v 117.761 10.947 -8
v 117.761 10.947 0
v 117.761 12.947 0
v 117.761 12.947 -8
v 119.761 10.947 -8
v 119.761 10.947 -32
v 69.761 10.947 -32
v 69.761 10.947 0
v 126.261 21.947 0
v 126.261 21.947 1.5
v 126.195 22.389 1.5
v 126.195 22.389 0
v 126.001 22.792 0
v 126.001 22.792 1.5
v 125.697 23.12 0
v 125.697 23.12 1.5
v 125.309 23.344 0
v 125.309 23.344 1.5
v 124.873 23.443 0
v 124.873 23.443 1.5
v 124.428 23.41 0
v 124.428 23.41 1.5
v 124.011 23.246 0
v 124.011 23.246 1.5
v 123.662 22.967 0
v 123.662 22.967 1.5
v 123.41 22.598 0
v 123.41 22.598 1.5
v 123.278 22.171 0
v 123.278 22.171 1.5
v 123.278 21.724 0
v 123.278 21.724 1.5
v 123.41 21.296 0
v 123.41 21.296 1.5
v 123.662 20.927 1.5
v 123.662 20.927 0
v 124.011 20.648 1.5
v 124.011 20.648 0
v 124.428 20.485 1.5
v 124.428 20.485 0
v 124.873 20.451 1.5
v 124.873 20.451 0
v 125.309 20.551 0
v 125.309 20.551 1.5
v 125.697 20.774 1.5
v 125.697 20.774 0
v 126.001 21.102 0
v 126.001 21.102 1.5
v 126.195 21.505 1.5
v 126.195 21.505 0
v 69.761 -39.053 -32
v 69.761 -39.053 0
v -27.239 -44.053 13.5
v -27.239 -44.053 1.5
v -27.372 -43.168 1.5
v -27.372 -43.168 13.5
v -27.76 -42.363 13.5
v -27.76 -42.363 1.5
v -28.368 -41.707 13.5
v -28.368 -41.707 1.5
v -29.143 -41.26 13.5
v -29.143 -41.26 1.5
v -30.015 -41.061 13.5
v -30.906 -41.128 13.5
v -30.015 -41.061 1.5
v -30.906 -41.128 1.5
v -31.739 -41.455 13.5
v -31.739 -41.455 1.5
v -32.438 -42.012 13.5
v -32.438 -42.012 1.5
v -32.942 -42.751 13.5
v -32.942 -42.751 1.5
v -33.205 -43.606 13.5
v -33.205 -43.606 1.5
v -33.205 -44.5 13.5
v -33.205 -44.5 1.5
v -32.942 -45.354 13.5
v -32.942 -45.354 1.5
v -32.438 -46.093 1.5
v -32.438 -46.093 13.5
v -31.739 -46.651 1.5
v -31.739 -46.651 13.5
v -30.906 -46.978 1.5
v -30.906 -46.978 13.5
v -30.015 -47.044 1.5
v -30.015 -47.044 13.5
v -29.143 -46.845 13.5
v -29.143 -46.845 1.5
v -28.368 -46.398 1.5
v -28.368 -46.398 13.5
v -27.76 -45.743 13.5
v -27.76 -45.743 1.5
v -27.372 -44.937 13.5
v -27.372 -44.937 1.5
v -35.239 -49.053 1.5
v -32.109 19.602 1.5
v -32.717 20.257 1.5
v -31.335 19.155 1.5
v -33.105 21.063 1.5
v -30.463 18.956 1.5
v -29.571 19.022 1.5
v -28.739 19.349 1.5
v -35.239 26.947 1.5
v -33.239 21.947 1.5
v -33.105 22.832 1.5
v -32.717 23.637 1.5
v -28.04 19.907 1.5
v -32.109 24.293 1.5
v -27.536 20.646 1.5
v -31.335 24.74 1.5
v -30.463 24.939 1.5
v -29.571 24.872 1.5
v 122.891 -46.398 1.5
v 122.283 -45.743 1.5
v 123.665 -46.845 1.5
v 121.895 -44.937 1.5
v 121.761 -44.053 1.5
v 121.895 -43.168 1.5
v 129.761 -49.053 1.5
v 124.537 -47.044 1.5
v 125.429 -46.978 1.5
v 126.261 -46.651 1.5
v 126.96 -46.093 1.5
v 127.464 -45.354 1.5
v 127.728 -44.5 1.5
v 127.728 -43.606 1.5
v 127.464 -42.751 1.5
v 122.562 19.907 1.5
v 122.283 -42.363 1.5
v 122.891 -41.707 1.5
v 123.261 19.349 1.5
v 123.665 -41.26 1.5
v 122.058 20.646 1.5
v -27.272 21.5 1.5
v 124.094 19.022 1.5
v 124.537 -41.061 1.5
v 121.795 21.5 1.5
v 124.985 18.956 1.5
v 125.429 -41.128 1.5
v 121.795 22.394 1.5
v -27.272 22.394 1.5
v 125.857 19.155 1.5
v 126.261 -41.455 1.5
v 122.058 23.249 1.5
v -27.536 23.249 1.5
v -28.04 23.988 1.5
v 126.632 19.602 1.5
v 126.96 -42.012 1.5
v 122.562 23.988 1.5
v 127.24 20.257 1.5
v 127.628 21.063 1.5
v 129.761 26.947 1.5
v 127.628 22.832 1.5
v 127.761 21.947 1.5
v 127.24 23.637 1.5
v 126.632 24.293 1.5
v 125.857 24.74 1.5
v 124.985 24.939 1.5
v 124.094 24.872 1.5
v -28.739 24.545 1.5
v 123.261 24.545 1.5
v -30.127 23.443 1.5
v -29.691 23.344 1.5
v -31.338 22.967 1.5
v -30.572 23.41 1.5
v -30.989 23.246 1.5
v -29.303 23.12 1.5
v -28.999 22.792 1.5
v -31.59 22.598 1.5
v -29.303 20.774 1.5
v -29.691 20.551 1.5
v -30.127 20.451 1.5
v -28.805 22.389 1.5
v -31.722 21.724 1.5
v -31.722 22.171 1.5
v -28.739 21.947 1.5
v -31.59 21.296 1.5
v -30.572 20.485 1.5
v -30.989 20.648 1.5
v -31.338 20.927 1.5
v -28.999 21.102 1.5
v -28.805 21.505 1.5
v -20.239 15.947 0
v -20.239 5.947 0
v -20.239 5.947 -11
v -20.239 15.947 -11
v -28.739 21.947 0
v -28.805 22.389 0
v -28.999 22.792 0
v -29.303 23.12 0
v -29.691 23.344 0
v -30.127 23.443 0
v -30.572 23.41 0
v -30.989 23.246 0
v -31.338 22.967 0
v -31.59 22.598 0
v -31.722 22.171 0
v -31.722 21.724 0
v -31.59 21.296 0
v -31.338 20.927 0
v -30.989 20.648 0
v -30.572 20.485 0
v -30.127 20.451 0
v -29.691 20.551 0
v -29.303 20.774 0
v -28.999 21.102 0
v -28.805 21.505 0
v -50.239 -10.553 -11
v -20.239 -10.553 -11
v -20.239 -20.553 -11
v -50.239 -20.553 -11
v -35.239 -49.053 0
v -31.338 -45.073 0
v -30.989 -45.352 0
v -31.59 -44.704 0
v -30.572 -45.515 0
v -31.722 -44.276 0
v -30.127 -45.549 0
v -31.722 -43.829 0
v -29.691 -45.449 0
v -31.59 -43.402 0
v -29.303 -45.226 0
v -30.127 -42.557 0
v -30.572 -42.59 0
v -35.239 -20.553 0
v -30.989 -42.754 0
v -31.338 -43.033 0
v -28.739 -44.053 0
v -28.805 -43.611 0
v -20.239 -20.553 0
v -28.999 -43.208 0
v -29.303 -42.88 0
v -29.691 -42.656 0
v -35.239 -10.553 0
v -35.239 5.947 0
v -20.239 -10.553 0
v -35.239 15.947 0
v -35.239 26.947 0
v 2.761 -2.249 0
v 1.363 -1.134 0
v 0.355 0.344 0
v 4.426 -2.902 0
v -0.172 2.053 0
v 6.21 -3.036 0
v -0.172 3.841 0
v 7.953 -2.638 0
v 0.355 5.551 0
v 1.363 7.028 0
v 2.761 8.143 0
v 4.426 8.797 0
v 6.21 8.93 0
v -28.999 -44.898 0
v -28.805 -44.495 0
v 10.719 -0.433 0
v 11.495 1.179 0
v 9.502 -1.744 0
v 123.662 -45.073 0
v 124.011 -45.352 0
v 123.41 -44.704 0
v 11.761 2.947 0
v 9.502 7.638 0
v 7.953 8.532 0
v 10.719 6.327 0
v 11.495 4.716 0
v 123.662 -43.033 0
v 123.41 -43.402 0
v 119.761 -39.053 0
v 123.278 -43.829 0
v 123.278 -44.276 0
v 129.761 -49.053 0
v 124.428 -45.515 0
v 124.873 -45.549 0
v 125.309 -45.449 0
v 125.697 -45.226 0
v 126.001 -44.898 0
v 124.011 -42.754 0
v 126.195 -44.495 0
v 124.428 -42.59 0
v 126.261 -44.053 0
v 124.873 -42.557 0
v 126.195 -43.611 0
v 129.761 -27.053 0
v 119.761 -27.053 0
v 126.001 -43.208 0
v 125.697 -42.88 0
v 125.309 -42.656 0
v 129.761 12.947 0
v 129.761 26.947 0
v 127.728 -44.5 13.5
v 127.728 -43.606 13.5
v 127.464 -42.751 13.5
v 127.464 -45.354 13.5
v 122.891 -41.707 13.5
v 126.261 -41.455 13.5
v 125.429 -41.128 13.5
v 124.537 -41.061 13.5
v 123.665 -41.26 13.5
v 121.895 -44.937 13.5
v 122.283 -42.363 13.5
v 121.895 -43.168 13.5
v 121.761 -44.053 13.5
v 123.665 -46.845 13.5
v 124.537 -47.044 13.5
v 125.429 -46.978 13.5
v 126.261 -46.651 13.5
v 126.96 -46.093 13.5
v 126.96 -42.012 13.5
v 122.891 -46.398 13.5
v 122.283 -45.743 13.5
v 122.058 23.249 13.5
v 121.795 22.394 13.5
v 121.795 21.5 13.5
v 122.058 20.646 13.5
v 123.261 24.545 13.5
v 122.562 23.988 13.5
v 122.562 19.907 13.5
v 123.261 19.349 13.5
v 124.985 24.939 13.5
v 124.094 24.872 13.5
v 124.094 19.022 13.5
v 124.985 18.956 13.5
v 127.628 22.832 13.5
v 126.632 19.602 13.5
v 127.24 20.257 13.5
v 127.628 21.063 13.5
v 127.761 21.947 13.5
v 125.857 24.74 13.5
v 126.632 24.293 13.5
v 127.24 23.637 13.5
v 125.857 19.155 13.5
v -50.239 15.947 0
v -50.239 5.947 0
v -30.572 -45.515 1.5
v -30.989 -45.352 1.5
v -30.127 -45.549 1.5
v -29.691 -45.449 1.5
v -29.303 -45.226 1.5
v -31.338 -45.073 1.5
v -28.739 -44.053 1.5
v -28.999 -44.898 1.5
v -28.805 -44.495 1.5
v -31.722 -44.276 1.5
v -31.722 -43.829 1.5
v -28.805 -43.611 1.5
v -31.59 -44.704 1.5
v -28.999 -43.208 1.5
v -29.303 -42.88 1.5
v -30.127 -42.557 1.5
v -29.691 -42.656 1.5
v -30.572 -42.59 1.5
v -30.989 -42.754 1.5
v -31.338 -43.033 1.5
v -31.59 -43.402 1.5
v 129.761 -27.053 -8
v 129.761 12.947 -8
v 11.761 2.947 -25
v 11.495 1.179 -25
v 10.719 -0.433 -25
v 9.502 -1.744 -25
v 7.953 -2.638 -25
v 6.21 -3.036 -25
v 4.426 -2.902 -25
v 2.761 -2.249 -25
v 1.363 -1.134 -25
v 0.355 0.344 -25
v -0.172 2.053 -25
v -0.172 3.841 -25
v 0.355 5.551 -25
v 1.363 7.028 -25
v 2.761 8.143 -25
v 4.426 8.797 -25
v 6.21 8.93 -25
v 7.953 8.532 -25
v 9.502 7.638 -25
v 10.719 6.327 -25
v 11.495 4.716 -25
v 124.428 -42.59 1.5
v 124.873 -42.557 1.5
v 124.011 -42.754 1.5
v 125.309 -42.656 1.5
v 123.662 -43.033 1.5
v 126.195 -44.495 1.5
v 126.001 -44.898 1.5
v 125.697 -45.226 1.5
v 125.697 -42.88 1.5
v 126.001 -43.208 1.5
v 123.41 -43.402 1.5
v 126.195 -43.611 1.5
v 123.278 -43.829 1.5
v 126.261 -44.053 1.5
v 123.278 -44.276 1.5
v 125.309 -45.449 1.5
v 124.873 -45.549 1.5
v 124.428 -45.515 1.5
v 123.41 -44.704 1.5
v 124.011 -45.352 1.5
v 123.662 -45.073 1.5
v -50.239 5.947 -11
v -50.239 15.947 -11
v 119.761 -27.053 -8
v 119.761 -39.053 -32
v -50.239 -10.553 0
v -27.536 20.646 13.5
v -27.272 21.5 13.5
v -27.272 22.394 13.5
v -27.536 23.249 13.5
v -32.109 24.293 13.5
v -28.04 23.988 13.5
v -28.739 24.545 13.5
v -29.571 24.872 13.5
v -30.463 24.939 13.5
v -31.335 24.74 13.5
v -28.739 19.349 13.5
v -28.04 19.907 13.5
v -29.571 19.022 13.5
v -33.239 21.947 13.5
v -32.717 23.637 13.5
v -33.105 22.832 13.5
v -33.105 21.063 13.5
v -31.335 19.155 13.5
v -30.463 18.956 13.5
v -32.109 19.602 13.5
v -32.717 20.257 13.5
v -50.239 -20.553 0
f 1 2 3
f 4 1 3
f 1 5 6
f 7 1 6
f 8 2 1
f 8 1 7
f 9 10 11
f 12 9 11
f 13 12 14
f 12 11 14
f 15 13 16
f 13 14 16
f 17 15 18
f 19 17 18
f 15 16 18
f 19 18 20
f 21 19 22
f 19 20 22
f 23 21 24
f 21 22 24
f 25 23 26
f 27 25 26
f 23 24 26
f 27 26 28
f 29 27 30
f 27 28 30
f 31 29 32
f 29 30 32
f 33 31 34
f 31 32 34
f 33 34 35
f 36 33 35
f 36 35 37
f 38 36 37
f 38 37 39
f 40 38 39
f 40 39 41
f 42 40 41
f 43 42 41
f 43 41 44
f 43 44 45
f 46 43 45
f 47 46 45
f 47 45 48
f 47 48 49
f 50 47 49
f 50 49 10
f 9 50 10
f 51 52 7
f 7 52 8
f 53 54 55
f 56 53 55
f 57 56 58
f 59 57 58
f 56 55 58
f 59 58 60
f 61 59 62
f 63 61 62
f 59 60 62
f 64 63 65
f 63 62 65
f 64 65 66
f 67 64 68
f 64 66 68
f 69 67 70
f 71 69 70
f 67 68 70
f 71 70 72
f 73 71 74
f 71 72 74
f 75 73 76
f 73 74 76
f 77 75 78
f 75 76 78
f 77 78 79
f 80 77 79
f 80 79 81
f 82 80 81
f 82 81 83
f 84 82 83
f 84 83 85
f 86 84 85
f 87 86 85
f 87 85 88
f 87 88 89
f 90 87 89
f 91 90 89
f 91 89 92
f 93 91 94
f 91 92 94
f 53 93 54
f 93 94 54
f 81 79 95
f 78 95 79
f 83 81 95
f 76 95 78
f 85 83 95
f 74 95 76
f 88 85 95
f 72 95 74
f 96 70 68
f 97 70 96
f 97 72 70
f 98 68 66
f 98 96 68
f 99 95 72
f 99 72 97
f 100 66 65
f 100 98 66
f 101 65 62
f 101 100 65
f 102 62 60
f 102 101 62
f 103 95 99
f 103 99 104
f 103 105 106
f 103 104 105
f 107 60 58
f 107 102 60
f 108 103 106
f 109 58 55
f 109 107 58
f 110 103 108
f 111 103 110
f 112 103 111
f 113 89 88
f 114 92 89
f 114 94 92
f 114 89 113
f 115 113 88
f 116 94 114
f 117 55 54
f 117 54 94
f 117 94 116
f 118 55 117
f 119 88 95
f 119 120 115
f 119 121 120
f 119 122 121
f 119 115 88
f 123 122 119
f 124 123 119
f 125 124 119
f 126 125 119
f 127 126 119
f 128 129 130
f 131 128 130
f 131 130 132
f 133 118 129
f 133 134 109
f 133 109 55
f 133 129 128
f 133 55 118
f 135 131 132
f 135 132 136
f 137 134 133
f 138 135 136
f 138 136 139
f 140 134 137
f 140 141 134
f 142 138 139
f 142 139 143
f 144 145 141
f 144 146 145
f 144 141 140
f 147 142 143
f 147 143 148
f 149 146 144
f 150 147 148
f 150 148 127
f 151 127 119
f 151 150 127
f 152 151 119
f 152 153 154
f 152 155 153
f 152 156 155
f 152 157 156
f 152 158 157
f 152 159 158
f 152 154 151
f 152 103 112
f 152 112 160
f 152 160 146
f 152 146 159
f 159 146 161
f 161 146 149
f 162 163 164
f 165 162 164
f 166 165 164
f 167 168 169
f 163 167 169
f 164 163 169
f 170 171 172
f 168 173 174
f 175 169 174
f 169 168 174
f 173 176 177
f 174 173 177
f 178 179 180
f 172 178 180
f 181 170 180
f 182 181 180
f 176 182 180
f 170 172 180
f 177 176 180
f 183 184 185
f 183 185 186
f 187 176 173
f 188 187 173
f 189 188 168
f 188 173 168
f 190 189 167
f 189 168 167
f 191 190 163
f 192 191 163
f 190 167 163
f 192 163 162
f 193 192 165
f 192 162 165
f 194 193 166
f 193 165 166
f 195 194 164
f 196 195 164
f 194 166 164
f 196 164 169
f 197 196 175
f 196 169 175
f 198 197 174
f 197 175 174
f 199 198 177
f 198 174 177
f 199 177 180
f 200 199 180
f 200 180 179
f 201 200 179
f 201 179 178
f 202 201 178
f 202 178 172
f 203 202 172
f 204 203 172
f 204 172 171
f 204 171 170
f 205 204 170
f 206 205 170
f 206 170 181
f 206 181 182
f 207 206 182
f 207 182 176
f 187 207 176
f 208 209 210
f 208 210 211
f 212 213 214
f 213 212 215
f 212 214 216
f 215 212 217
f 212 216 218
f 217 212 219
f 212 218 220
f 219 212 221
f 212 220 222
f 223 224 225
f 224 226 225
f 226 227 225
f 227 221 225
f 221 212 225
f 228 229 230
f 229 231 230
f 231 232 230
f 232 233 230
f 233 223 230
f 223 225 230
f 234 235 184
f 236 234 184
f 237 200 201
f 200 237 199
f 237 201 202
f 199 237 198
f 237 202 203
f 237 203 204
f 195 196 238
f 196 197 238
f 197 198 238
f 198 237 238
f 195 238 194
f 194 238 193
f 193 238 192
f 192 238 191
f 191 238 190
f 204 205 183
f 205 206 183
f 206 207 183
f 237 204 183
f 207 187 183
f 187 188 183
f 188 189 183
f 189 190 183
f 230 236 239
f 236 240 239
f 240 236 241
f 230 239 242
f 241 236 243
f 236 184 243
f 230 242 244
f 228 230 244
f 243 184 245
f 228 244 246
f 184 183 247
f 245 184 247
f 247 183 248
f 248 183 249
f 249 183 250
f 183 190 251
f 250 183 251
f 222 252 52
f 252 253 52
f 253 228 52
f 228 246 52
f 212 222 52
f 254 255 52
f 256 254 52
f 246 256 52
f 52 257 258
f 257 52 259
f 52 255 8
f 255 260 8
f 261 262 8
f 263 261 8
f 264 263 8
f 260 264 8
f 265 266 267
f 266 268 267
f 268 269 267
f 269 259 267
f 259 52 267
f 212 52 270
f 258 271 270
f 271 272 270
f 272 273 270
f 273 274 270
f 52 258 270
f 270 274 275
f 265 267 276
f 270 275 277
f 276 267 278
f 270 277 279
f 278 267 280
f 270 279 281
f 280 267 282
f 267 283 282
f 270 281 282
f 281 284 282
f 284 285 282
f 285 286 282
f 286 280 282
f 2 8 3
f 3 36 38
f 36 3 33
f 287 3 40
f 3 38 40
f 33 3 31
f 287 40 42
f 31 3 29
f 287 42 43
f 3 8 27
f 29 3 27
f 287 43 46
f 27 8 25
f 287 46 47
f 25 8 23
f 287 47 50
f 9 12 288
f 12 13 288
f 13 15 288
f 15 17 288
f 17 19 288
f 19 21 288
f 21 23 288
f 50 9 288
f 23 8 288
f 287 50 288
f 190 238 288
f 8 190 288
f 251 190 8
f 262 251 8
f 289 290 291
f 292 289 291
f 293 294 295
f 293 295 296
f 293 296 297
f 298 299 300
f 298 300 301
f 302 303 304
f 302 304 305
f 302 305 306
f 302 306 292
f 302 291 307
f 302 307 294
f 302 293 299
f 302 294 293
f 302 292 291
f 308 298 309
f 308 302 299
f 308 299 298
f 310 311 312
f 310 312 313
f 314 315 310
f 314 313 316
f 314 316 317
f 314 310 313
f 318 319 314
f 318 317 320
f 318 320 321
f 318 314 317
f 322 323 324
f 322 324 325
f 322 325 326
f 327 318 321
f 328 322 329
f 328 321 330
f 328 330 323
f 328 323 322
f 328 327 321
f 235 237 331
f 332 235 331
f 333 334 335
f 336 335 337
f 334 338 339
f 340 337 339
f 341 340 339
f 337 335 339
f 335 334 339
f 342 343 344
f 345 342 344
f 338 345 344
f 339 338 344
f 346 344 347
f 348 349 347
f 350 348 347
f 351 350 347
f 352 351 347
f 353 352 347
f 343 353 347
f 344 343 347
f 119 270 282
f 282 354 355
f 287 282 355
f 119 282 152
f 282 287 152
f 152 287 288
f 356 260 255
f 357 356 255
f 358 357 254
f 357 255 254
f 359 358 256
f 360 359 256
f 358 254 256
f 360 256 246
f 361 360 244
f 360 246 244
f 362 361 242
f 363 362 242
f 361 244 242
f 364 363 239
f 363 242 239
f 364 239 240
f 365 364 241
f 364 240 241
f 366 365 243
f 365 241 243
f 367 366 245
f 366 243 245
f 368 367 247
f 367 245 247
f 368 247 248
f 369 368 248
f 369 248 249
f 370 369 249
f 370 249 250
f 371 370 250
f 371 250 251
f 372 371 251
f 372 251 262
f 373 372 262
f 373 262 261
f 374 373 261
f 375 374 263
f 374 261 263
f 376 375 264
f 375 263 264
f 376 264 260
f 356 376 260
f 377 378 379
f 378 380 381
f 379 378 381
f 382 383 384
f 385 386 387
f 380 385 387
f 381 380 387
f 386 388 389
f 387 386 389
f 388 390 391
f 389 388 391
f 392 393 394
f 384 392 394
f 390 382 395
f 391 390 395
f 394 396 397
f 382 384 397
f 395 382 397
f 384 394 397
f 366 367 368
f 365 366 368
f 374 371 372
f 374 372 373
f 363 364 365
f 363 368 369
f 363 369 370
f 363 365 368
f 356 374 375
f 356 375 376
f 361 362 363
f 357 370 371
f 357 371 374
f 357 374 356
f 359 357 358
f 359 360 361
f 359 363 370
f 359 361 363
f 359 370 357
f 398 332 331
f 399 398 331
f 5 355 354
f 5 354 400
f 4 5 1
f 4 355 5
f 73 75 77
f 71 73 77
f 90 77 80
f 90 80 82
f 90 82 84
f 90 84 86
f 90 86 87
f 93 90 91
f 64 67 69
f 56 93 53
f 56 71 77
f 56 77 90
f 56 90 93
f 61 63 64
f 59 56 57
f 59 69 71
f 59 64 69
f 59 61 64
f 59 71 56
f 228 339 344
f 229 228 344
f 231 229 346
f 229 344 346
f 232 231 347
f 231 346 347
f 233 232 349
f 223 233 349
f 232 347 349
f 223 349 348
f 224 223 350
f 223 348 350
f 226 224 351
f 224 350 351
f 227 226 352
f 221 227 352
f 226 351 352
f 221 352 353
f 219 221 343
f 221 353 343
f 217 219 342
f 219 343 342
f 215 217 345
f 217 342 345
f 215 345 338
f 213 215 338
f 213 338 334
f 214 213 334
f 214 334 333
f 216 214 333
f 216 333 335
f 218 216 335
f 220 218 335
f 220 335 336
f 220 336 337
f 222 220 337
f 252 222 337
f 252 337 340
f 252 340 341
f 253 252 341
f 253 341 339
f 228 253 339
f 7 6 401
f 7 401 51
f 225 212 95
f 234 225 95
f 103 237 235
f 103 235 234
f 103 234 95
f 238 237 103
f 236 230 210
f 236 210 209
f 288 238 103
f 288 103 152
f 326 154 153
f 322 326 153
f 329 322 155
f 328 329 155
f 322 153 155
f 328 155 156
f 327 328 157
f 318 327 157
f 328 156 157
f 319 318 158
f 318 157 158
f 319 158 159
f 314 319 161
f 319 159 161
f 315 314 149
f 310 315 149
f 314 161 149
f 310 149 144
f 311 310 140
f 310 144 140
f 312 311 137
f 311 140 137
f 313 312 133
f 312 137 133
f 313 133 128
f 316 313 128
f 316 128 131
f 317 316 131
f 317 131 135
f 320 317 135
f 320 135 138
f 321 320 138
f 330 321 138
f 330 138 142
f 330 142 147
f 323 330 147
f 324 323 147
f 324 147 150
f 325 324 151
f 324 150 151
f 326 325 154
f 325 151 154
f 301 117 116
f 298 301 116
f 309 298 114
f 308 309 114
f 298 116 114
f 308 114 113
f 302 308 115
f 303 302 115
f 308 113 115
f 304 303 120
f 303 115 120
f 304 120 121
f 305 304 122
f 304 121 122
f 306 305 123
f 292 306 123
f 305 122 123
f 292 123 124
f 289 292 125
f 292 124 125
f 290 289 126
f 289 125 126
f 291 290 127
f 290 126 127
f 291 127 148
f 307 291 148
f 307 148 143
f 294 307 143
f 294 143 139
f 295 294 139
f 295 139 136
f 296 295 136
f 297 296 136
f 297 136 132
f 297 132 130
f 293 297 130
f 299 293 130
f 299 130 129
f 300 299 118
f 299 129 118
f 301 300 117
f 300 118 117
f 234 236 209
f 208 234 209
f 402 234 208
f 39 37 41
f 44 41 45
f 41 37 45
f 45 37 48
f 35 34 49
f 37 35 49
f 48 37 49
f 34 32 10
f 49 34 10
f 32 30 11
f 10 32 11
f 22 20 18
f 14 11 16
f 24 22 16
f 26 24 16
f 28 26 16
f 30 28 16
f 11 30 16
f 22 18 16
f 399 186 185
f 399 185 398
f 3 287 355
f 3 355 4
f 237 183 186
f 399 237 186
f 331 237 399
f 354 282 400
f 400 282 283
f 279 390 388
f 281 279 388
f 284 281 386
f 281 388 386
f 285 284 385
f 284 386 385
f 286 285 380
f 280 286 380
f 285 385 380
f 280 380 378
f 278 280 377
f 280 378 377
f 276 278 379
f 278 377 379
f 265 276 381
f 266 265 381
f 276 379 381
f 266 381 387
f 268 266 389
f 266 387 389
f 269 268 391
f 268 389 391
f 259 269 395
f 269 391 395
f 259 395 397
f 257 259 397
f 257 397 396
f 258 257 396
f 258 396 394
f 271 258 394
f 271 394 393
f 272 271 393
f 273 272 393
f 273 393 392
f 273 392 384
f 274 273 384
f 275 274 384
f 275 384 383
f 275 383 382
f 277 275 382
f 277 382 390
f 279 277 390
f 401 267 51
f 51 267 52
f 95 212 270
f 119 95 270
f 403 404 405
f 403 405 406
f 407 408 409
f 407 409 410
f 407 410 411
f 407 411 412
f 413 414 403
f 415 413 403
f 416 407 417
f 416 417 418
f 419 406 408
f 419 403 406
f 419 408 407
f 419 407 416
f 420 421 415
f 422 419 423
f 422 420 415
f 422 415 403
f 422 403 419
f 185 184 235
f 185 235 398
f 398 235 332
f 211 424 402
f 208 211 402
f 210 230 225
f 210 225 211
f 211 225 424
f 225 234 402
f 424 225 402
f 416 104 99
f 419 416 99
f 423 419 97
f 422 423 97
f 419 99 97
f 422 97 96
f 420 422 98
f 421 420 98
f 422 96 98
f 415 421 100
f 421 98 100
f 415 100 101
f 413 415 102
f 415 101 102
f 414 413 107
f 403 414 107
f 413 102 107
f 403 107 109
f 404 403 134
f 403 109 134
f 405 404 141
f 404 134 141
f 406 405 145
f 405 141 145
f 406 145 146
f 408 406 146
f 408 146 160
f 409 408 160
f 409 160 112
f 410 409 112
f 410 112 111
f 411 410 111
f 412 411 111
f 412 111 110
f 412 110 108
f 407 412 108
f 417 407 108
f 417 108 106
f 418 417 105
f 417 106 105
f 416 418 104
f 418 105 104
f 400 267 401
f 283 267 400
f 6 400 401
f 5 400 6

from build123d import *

# Parameters (mm, degrees)
SKETCH1_W           = 165
SKETCH1_H           = 76
BOSS_EXTRUDE1_DEPTH = 1.5
CUT_EXTRUDE1_REACH  = 140.731
SKETCH2_R           = 1.5
SKETCH3_W           = 12
SKETCH3_H           = 40
BOSS_EXTRUDE2_DEPTH = 8
SKETCH4_W           = 50
SKETCH4_H           = 50
BOSS_EXTRUDE3_DEPTH = 32
SKETCH5_W           = 30
SKETCH5_H           = 10
BOSS_EXTRUDE4_DEPTH = 11
SKETCH6_R           = 6
BOSS_EXTRUDE5_DEPTH = 25
SKETCH7_R           = 3
BOSS_EXTRUDE6_DEPTH = 12


with BuildPart() as part:
    # Sketch1 → Boss-Extrude1 (new body)
    with BuildSketch(Plane.XY):
        with Locations((47.261306533, -11.052763819)):
            Rectangle(SKETCH1_W, SKETCH1_H)
    extrude(amount=BOSS_EXTRUDE1_DEPTH)

    # Sketch2 → Cut-Extrude1 (cut, up to next)
    with BuildSketch(Plane.XY.offset(1.5), mode=Mode.PRIVATE) as cut_extrude1_sk1:
        with Locations((124.761306533, 21.947236181)):
            Circle(SKETCH2_R)
    cut_extrude1_tool1 = extrude(cut_extrude1_sk1.sketch, amount=-CUT_EXTRUDE1_REACH, mode=Mode.PRIVATE) & part.part
    # Sketch2 → Cut-Extrude1 (cut, up to next)
    with BuildSketch(Plane.XY.offset(1.5), mode=Mode.PRIVATE) as cut_extrude1_sk2:
        with Locations((124.761306533, -44.052763819)):
            Circle(SKETCH2_R)
    cut_extrude1_tool2 = extrude(cut_extrude1_sk2.sketch, amount=-CUT_EXTRUDE1_REACH, mode=Mode.PRIVATE) & part.part
    # Sketch2 → Cut-Extrude1 (cut, up to next)
    with BuildSketch(Plane.XY.offset(1.5), mode=Mode.PRIVATE) as cut_extrude1_sk3:
        with Locations((-30.238693467, -44.052763819)):
            Circle(SKETCH2_R)
    cut_extrude1_tool3 = extrude(cut_extrude1_sk3.sketch, amount=-CUT_EXTRUDE1_REACH, mode=Mode.PRIVATE) & part.part
    # Sketch2 → Cut-Extrude1 (cut, up to next)
    with BuildSketch(Plane.XY.offset(1.5), mode=Mode.PRIVATE) as cut_extrude1_sk4:
        with Locations((-30.238693467, 21.947236181)):
            Circle(SKETCH2_R)
    cut_extrude1_tool4 = extrude(cut_extrude1_sk4.sketch, amount=-CUT_EXTRUDE1_REACH, mode=Mode.PRIVATE) & part.part
    add(cut_extrude1_tool1.solids().sort_by_distance((124.761307, 21.947236, 1.5))[0], mode=Mode.SUBTRACT)
    add(cut_extrude1_tool2.solids().sort_by_distance((124.761307, -44.052764, 1.5))[0], mode=Mode.SUBTRACT)
    add(cut_extrude1_tool3.solids().sort_by_distance((-30.238693, -44.052764, 1.5))[0], mode=Mode.SUBTRACT)
    add(cut_extrude1_tool4.solids().sort_by_distance((-30.238693, 21.947236, 1.5))[0], mode=Mode.SUBTRACT)

    # Sketch3 → Boss-Extrude2 (add)
    with BuildSketch(Plane(origin=(0, 0, 0), x_dir=(-1, 0, 0), z_dir=(0, 0, -1))):
        with Locations((-123.761306533, -7.052763819)):
            Rectangle(SKETCH3_W, SKETCH3_H)
    extrude(amount=BOSS_EXTRUDE2_DEPTH)

    # Sketch4 → Boss-Extrude3 (add)
    with BuildSketch(Plane(origin=(0, 0, 0), x_dir=(-1, 0, 0), z_dir=(0, 0, -1))):
        with Locations((-94.761306533, -14.052763819)):
            Rectangle(SKETCH4_W, SKETCH4_H)
    extrude(amount=BOSS_EXTRUDE3_DEPTH)

    # Sketch5 → Boss-Extrude4 (add)
    with BuildSketch(Plane(origin=(0, 0, 0), x_dir=(-1, 0, 0), z_dir=(0, 0, -1))):
        with Locations((35.238693467, 10.947236181)):
            Rectangle(SKETCH5_W, SKETCH5_H)
        with Locations((35.238693467, -15.552763819)):
            Rectangle(SKETCH5_W, SKETCH5_H)
    extrude(amount=BOSS_EXTRUDE4_DEPTH)

    # Sketch6 → Boss-Extrude5 (add)
    with BuildSketch(Plane(origin=(0, 0, 0), x_dir=(-1, 0, 0), z_dir=(0, 0, -1))):
        with Locations(Location((-5.761306533, 2.947236181, 0), (0, 0, 180))):
            Circle(SKETCH6_R)
    extrude(amount=BOSS_EXTRUDE5_DEPTH)

    # Sketch7 → Boss-Extrude6 (add)
    with BuildSketch(Plane.XY.offset(1.5)):
        with Locations((124.761306533, 21.947236181)):
            Circle(SKETCH7_R)
        with Locations(Location((124.761306533, -44.052763819, 0), (0, 0, 180))):
            Circle(SKETCH7_R)
        with Locations(Location((-30.238693467, 21.947236181, 0), (0, 0, 180))):
            Circle(SKETCH7_R)
        with Locations((-30.238693467, -44.052763819)):
            Circle(SKETCH7_R)
    extrude(amount=BOSS_EXTRUDE6_DEPTH)


solid = part.part
